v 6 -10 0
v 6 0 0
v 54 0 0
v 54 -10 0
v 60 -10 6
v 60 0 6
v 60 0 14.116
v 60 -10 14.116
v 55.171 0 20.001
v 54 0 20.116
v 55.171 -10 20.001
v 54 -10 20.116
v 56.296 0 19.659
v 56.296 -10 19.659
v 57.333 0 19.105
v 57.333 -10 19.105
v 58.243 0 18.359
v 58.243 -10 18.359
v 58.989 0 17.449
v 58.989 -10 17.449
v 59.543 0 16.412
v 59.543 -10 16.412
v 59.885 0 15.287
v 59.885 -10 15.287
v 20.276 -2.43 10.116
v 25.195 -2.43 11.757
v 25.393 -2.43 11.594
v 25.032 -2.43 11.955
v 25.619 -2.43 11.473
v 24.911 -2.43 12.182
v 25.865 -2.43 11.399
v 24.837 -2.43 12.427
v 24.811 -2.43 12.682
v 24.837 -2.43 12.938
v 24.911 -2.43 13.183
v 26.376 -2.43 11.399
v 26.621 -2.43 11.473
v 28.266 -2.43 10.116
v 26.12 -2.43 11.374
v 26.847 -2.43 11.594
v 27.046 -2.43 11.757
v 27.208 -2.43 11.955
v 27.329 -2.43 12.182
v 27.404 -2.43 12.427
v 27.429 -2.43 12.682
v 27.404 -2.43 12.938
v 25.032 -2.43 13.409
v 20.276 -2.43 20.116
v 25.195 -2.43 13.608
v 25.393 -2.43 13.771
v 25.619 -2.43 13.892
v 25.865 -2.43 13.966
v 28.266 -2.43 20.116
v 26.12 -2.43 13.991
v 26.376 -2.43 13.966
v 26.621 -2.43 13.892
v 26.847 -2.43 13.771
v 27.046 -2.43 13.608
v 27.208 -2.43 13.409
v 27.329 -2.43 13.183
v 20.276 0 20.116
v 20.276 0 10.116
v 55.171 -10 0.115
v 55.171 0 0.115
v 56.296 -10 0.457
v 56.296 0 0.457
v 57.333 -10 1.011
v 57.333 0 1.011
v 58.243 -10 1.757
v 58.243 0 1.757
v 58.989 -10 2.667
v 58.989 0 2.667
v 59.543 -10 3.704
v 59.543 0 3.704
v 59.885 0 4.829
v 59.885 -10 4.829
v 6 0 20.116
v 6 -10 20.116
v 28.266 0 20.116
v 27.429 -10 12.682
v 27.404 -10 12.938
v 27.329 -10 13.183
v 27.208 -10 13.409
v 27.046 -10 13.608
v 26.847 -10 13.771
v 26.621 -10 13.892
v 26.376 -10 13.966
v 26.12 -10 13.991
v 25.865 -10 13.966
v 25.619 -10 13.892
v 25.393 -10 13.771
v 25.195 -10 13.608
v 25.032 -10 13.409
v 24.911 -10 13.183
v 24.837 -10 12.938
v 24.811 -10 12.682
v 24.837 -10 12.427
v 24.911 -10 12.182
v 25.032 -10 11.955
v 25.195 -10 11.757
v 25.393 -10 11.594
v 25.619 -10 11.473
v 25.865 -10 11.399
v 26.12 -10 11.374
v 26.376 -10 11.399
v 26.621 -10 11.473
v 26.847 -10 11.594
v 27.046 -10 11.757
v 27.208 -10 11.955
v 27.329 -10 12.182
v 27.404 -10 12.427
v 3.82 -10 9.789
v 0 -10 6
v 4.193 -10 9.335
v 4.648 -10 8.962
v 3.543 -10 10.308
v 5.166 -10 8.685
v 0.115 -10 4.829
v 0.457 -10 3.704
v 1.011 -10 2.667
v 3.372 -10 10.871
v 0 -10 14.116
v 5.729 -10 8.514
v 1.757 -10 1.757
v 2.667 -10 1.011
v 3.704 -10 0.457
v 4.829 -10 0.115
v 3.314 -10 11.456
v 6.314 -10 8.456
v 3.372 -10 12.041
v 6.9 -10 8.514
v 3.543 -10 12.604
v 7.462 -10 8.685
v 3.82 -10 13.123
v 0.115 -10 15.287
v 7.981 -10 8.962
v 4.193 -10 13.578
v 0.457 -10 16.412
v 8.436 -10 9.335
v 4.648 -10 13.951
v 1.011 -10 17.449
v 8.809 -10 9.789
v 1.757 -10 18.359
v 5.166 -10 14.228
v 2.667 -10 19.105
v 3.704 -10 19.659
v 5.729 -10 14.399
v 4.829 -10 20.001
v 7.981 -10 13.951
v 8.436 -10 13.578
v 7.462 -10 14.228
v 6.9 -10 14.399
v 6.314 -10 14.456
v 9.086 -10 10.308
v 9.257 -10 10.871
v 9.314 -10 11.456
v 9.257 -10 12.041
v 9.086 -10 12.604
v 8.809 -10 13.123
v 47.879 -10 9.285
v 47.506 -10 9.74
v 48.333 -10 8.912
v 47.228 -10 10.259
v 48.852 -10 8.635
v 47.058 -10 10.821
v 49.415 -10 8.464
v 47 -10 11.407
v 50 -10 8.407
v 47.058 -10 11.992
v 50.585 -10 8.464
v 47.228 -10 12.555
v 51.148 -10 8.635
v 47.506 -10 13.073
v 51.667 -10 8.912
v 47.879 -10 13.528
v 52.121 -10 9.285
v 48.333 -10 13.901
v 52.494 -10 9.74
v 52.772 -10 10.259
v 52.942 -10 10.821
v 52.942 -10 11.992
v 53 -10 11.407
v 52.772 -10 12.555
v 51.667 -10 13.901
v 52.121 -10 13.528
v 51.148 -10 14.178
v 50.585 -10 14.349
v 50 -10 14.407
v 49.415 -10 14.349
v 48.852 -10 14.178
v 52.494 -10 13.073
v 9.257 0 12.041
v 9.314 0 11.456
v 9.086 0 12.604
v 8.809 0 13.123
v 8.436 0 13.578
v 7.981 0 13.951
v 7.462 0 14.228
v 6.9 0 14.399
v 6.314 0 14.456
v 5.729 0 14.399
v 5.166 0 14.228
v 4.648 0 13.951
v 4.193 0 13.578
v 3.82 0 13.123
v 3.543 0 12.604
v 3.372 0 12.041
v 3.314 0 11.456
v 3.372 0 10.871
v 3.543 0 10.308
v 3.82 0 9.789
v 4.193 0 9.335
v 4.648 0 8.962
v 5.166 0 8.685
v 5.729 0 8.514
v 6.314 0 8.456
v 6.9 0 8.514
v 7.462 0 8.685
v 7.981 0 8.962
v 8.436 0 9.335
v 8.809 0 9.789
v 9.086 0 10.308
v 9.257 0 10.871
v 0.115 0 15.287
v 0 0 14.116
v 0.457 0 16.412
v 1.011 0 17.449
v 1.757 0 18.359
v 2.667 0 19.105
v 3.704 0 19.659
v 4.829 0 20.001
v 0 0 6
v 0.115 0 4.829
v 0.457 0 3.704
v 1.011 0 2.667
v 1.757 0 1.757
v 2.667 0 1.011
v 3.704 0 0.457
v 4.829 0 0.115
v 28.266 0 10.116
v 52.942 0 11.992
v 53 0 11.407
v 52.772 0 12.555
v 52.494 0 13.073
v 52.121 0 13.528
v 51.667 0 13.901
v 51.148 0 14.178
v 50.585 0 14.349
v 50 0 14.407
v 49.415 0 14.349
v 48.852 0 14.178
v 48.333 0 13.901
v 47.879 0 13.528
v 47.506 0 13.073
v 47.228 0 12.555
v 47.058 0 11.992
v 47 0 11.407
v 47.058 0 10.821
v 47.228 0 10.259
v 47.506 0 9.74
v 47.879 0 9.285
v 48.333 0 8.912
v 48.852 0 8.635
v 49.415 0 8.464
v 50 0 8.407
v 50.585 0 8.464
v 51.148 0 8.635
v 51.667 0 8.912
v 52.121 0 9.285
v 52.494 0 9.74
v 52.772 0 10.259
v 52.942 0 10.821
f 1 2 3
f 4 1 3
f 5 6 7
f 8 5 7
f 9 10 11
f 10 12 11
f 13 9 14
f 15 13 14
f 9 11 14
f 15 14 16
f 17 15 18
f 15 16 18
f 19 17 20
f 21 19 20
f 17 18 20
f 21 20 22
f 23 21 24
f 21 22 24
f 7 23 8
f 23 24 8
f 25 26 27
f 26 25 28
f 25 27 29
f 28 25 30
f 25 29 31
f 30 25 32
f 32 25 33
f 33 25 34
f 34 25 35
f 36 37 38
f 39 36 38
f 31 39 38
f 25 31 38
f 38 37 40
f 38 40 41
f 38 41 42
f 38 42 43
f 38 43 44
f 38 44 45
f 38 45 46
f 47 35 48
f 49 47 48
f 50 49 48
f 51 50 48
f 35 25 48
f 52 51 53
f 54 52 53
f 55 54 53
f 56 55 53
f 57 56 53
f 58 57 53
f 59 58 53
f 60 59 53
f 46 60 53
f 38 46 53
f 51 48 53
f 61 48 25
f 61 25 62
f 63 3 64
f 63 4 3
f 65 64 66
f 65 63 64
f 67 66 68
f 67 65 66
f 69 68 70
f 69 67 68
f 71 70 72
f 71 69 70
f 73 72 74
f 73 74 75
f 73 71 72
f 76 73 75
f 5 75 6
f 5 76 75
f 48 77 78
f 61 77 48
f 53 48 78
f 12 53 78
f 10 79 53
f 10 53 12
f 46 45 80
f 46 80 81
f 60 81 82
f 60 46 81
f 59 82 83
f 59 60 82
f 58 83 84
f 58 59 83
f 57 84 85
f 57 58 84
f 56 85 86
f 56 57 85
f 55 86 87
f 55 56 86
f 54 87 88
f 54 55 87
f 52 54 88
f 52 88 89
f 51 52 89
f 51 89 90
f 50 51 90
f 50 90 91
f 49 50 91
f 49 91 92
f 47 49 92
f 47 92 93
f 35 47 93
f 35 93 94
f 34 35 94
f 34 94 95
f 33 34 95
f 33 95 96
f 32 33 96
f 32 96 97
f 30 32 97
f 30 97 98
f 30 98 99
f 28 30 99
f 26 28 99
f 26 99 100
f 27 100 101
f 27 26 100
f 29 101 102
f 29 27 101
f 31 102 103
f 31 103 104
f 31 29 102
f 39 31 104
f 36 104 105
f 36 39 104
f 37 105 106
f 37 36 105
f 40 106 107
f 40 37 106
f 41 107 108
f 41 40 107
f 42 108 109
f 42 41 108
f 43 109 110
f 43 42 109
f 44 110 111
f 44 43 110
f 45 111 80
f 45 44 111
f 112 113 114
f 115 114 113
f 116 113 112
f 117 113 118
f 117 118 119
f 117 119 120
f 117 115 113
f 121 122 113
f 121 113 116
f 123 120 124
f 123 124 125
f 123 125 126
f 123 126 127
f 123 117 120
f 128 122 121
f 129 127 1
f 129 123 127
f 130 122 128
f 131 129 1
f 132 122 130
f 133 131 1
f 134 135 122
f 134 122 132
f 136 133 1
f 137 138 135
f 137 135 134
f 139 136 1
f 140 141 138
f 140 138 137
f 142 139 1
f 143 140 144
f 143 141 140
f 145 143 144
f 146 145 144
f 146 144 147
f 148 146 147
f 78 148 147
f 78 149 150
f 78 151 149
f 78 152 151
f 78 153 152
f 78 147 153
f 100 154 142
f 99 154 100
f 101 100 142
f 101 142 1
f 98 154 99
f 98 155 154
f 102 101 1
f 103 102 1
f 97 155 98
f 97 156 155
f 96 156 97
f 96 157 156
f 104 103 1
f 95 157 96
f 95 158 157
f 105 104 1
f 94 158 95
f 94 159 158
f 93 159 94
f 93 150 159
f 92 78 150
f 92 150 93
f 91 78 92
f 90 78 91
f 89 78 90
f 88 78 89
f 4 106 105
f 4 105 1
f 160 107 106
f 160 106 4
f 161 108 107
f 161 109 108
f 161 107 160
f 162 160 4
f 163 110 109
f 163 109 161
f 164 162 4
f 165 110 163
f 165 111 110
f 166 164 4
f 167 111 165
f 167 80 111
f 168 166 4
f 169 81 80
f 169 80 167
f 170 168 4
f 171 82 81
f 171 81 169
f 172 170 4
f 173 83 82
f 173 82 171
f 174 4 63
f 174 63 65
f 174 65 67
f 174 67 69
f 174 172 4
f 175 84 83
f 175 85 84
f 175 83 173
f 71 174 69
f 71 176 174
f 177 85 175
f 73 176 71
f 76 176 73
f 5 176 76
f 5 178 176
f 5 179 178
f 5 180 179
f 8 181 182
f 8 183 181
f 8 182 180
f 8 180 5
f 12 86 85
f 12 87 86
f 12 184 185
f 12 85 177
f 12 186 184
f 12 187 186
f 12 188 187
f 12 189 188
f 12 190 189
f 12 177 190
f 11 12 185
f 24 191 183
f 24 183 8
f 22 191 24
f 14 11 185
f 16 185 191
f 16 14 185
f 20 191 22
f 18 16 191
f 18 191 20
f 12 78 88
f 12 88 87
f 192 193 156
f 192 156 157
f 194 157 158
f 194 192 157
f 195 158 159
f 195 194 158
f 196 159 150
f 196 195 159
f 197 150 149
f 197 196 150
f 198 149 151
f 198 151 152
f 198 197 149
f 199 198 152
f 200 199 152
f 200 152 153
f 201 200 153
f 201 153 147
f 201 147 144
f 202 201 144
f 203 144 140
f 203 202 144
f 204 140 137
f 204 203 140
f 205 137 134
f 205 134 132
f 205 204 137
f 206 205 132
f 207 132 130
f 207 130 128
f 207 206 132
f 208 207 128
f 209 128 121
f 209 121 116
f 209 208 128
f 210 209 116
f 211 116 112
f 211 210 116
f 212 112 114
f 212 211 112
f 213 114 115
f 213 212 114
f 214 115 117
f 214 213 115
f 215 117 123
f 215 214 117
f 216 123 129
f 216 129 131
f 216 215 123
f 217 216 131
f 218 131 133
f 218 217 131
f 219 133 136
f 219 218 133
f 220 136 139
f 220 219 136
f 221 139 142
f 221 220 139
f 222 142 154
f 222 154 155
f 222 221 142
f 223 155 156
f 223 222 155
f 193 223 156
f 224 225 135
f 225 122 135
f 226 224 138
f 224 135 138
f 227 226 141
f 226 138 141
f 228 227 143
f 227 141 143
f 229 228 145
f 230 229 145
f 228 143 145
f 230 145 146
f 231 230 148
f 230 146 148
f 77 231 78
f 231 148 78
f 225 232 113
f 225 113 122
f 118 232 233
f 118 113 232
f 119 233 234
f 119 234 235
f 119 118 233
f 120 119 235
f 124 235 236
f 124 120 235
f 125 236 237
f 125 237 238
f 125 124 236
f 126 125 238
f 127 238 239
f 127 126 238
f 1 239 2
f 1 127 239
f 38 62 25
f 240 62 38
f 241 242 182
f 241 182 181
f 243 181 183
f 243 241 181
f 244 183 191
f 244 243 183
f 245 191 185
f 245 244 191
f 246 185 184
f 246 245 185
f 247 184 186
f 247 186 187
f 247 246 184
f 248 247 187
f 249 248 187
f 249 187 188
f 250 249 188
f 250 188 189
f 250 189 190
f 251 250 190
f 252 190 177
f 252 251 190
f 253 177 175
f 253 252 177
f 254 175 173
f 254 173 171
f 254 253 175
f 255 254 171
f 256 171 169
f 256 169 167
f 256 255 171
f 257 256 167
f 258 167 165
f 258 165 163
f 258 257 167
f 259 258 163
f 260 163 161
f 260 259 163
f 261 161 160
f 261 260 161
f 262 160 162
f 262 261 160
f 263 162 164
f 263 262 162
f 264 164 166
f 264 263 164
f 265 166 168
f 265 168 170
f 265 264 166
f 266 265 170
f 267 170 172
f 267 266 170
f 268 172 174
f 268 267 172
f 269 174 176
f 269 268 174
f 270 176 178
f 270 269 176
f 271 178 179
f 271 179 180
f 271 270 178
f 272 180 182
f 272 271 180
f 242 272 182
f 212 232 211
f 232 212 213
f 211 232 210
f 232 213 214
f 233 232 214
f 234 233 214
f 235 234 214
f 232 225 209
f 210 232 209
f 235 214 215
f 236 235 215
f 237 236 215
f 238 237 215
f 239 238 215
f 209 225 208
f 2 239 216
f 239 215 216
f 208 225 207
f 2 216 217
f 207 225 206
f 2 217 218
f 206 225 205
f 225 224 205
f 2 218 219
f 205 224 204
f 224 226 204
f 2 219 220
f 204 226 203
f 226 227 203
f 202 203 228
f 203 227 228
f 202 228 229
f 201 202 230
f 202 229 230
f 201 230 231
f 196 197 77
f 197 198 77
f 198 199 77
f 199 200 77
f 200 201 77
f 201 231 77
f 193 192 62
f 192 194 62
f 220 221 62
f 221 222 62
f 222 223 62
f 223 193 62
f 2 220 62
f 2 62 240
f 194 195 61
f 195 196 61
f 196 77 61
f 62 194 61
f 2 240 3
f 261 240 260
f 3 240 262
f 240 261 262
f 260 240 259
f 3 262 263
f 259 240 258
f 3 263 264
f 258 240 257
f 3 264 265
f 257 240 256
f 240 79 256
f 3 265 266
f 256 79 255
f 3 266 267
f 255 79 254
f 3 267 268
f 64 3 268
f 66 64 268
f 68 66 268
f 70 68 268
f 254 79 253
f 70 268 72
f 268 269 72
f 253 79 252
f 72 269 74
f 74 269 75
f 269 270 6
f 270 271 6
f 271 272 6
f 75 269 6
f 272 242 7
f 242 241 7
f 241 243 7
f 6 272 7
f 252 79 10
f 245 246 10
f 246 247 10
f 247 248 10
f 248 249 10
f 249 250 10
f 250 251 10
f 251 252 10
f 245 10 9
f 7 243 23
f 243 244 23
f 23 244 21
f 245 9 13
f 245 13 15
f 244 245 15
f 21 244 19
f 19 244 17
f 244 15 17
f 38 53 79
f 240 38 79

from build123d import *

# Parameters (mm, degrees)
F0_W     = 60
F0_H     = 20.115981
F0_R     = 3
F0_R_2   = 1.308767
F1_DEPTH = 10
F3_R     = 6
F4_W     = 7.989561
F4_H     = 2.429715
F5_DEPTH = 10


with BuildPart() as f1:
    # F0 (on Front) → F1 (new body)
    with BuildSketch(Plane.XZ):
        with Locations((30, 10.05799)):
            Rectangle(F0_W, F0_H)
        with Locations((6.314433, 11.456186)):
            Circle(F0_R, mode=Mode.SUBTRACT)
        with Locations((26.120204, 12.682377)):
            Circle(F0_R_2, mode=Mode.SUBTRACT)
        with Locations((50, 11.406668)):
            Circle(F0_R, mode=Mode.SUBTRACT)
    extrude(amount=F1_DEPTH)

    # F3
    f3_edges = [f1.edges().sort_by_distance(p)[0] for p in [
        (0, -5, 0),
        (0, -5, 20.115981),
        (60, -5, 0),
        (60, -5, 20.115981),
    ]]
    fillet(f3_edges, radius=F3_R)

    # F4 (on face) → F5 (cut)
    with BuildSketch(Plane.XY.offset(20.115981)):
        with Locations((24.271051, -1.214857)):
            Rectangle(F4_W, F4_H)
    extrude(amount=-F5_DEPTH, mode=Mode.SUBTRACT)


solid = f1.part
